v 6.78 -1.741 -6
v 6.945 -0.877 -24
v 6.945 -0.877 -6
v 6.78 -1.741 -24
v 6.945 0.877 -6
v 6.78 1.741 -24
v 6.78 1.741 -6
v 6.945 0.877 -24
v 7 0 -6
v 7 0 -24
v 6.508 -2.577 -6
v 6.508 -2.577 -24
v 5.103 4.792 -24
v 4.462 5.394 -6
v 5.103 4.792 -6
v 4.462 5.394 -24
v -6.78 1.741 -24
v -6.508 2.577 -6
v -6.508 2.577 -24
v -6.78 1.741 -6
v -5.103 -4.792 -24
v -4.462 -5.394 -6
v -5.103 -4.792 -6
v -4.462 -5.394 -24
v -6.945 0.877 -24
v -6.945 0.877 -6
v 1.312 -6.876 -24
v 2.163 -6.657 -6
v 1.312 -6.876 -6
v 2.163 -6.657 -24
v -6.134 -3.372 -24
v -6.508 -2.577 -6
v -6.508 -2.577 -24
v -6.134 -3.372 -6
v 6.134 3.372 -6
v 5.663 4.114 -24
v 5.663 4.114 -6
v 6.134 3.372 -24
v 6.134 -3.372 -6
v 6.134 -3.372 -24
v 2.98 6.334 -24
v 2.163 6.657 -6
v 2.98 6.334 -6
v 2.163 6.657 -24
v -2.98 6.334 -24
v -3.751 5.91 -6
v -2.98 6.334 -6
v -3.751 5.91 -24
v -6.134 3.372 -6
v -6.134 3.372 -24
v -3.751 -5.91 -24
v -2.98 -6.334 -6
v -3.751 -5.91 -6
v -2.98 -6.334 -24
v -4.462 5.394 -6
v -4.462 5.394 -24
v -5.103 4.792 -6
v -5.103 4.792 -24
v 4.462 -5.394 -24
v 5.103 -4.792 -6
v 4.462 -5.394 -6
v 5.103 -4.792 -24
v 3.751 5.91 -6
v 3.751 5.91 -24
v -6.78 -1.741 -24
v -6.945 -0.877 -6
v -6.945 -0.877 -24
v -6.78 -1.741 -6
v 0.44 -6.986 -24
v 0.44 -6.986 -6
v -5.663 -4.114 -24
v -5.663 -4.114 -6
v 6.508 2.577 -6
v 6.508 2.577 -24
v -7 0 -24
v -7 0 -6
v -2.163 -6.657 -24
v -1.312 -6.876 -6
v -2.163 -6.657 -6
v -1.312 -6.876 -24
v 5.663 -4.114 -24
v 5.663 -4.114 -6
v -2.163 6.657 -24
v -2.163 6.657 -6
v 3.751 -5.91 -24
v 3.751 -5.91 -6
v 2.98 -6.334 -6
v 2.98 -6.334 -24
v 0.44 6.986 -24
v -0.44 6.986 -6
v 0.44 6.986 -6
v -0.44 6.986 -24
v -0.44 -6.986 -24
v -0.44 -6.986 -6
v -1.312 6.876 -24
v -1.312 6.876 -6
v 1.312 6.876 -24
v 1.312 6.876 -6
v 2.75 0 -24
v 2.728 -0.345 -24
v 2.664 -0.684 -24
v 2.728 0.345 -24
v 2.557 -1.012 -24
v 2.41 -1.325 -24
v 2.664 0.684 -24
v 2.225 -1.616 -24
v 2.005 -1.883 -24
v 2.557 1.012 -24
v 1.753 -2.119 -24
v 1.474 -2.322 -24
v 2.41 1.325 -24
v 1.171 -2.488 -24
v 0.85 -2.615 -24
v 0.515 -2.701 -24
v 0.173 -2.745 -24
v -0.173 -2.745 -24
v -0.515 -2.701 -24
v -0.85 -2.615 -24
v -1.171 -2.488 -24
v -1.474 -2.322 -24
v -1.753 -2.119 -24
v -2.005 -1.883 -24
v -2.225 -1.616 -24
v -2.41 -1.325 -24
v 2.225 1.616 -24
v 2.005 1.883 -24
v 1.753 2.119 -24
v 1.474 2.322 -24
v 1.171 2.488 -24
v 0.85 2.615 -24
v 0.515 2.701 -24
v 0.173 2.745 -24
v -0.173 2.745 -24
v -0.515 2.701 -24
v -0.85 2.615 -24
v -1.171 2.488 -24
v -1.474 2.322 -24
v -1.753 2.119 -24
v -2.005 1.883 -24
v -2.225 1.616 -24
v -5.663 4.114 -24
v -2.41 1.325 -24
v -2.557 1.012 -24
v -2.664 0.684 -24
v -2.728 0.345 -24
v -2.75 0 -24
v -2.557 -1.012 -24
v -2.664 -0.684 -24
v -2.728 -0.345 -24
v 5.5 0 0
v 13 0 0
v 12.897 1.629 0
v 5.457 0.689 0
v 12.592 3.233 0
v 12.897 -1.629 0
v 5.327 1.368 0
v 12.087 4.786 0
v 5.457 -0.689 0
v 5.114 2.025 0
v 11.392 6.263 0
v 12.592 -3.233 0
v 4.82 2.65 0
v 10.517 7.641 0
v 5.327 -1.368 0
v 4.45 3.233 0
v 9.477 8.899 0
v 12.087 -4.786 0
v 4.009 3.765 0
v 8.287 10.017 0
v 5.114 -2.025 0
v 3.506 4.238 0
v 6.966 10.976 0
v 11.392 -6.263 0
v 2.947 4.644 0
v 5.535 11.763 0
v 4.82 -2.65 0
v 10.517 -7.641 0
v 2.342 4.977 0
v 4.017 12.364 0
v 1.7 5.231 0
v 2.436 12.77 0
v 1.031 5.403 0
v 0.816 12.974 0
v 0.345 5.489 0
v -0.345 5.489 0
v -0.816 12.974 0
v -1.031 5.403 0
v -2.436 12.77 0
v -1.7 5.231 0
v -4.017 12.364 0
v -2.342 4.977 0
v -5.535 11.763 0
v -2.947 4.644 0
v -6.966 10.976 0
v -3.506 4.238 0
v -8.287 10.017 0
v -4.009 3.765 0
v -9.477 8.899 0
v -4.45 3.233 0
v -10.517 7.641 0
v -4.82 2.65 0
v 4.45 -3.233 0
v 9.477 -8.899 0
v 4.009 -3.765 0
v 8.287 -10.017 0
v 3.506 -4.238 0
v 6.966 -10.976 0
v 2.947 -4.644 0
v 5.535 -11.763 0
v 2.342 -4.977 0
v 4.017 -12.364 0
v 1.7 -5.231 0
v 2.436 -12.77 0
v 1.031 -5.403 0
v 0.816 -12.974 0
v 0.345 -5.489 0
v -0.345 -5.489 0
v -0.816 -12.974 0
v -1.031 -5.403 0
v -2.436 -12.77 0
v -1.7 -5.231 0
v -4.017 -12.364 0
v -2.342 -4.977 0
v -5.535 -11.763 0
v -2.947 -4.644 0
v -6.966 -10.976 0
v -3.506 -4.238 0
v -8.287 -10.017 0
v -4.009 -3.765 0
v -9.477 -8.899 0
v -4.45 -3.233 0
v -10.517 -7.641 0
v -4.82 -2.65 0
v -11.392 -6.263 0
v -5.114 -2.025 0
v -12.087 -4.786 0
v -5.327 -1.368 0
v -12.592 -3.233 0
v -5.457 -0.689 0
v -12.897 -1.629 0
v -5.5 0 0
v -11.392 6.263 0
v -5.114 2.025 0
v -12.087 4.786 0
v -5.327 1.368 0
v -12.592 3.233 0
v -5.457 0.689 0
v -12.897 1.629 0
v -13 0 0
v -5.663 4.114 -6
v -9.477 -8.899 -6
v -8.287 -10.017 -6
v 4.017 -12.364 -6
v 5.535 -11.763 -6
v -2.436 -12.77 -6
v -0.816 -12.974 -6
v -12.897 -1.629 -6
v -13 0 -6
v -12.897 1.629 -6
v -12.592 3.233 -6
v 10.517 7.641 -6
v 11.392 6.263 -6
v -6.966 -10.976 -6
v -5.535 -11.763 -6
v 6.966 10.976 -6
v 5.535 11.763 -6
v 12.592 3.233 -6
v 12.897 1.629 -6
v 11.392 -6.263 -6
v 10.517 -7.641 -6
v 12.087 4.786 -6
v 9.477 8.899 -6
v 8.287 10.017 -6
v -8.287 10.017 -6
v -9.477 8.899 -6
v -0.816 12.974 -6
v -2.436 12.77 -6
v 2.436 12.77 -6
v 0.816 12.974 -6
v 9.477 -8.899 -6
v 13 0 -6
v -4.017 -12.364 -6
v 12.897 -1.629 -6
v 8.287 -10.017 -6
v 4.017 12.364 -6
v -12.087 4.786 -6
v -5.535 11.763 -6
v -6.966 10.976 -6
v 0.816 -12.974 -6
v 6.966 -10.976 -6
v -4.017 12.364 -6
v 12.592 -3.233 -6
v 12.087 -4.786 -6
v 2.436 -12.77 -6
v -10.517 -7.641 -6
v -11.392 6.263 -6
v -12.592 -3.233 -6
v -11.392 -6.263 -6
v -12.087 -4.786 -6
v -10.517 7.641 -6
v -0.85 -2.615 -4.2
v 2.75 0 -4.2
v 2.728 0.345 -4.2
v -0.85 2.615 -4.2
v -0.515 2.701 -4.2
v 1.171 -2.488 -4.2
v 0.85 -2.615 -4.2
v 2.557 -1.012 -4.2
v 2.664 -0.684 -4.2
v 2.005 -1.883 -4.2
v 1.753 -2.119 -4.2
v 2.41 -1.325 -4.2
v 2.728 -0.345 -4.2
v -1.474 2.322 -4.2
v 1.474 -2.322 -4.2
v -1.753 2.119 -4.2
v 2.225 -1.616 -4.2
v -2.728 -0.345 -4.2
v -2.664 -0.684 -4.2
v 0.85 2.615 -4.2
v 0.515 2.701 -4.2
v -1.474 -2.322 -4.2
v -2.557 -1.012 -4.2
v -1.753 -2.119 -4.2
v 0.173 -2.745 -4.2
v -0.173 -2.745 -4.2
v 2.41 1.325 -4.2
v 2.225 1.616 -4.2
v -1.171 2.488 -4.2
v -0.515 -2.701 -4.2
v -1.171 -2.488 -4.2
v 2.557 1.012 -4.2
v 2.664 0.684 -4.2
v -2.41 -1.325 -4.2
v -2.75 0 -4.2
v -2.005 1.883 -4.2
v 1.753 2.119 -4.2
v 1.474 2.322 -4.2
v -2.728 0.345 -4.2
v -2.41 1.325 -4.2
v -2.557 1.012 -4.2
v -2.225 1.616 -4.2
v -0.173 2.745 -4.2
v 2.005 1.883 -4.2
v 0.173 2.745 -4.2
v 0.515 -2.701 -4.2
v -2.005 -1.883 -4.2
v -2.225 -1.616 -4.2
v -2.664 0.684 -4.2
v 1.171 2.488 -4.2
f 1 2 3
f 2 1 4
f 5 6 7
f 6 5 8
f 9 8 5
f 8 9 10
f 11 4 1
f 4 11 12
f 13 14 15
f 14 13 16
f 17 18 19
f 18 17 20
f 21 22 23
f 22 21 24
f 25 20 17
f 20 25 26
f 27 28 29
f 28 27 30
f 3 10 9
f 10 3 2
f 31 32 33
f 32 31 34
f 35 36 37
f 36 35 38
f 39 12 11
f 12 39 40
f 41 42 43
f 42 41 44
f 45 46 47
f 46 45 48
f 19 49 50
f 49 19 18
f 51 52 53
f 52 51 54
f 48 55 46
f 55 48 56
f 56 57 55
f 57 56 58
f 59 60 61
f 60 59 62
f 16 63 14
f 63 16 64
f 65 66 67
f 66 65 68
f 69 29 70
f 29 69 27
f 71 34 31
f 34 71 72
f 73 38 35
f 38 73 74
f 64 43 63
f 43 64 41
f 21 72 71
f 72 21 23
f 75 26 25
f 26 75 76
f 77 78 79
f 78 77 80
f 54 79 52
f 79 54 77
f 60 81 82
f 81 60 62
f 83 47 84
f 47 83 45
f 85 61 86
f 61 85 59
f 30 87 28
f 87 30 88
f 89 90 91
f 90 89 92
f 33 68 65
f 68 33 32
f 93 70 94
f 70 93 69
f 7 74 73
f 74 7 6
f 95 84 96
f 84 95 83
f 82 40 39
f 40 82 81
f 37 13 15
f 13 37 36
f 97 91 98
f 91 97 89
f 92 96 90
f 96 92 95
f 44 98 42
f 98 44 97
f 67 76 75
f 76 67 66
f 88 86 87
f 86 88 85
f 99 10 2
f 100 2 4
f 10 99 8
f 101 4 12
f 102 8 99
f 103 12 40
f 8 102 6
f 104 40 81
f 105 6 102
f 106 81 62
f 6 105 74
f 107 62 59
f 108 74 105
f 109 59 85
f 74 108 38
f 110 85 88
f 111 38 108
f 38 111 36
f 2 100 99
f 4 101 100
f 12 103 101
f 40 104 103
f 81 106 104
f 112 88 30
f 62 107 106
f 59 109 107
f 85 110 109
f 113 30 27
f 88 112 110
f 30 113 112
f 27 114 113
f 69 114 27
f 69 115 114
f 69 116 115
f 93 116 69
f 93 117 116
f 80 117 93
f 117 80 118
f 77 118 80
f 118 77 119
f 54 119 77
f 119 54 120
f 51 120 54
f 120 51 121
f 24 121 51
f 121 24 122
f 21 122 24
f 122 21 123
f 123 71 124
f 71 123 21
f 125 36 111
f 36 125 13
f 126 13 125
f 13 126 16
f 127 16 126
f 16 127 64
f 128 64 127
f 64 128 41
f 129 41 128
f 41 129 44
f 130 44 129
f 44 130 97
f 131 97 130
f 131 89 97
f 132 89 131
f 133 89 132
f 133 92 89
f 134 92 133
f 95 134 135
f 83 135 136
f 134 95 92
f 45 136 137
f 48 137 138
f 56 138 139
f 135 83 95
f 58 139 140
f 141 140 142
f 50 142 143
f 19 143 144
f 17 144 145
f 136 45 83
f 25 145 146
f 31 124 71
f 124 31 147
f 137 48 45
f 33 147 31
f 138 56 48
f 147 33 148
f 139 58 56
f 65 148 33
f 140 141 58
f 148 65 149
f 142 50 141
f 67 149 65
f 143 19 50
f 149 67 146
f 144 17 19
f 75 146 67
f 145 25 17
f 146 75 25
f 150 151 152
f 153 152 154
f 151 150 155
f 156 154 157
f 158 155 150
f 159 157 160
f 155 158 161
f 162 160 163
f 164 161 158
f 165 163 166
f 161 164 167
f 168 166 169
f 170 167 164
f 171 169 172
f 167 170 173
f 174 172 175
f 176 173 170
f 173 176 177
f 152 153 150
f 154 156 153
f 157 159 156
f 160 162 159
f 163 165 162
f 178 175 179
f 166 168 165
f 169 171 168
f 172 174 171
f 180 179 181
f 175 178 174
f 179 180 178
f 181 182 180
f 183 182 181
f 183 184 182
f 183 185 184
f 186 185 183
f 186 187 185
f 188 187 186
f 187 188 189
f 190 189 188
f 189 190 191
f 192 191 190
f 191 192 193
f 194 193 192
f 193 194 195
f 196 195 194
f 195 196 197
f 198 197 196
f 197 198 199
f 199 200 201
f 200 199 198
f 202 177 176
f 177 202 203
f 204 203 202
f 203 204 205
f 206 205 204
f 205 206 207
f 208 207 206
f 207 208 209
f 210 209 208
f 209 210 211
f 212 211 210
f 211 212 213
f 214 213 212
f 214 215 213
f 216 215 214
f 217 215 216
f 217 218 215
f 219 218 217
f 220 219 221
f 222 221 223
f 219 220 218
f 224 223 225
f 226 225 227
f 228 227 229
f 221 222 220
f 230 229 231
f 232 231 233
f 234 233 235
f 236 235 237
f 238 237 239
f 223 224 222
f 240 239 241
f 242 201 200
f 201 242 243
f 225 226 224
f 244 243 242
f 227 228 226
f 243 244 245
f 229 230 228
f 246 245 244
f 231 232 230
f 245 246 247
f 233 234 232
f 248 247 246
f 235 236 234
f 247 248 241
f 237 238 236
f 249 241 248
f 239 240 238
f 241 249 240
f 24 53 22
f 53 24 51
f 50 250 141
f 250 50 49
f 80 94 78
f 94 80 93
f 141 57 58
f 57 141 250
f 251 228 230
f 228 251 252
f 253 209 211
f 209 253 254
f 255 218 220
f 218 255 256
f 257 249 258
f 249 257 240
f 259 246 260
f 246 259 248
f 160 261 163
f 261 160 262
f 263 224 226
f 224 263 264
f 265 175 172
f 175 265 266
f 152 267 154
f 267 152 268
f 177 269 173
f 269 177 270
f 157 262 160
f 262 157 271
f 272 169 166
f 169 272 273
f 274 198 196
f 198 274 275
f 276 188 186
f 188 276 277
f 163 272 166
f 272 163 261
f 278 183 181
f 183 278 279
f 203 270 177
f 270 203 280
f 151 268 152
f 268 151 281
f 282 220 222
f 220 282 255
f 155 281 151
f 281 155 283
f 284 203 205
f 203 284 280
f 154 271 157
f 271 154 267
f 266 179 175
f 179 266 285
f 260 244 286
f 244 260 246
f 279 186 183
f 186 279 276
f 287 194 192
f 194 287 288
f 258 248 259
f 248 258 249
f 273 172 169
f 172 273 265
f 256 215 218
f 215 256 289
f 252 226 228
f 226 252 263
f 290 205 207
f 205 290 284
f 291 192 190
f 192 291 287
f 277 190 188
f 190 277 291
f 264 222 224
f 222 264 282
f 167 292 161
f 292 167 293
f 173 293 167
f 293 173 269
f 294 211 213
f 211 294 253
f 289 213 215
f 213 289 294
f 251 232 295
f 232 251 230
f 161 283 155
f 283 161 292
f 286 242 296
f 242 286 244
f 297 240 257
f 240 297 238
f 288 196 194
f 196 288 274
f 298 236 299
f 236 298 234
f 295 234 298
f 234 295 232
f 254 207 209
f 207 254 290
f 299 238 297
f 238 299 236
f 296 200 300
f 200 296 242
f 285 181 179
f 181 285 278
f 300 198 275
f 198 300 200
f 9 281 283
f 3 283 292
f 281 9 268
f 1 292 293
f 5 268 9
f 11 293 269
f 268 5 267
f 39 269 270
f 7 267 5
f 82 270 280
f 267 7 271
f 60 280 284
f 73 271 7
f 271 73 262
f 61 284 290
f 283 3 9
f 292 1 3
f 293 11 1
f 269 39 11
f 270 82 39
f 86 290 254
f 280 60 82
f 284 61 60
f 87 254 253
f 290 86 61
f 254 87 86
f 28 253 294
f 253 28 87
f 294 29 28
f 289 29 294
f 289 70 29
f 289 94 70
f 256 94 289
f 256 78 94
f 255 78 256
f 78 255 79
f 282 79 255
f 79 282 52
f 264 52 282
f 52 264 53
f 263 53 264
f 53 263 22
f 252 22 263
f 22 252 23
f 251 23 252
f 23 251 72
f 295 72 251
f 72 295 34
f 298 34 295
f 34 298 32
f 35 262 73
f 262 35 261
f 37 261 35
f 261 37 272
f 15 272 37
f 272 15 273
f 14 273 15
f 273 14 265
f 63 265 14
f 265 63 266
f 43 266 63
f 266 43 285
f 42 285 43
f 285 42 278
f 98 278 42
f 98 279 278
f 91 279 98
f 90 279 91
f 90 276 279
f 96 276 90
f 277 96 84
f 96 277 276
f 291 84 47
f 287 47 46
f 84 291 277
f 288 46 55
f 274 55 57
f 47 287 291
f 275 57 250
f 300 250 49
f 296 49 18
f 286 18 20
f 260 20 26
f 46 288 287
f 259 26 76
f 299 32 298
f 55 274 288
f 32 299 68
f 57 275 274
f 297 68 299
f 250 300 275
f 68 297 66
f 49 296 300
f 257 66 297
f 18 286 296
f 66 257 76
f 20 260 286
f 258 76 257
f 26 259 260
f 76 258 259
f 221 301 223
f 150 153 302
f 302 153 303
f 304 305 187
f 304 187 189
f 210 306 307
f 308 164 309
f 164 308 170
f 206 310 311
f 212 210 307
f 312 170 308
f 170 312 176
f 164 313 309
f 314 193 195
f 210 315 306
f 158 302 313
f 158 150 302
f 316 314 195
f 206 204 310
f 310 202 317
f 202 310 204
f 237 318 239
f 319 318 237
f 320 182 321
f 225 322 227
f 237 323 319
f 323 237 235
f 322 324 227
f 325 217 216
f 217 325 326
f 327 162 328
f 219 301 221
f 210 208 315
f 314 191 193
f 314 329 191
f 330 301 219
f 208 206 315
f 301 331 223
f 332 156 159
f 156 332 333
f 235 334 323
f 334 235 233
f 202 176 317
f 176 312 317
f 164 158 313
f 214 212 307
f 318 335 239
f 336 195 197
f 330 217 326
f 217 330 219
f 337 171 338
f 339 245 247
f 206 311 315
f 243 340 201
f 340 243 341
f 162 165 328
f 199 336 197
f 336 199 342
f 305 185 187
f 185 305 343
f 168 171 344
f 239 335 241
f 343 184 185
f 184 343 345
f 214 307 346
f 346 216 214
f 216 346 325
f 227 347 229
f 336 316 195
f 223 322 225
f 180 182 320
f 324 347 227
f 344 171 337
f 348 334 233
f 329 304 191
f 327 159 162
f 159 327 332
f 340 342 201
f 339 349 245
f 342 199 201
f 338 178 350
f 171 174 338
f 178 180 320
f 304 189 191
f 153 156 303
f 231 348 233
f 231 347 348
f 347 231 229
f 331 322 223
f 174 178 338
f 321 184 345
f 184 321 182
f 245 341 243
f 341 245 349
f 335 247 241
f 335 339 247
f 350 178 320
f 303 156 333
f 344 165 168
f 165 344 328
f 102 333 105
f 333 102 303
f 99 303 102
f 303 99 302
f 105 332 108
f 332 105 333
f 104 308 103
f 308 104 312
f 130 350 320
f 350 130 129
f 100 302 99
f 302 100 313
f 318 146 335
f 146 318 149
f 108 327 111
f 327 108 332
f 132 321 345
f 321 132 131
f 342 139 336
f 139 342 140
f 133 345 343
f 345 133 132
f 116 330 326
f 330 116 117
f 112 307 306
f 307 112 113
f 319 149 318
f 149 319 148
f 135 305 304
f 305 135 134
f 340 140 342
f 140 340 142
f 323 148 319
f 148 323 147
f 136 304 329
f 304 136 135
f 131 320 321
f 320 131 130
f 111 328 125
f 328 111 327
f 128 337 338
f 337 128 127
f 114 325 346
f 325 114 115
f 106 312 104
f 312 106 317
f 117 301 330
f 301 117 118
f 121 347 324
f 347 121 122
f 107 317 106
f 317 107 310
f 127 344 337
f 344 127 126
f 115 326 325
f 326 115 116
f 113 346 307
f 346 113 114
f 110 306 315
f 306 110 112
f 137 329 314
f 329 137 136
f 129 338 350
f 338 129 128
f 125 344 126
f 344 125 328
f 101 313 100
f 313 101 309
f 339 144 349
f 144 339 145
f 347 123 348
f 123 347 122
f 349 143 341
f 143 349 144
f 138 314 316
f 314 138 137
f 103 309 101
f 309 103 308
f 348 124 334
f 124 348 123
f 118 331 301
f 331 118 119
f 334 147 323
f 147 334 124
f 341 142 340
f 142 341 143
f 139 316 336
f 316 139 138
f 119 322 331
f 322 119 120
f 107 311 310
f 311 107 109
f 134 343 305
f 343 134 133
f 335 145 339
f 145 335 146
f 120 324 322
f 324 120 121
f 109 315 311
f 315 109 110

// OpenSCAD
$fn = 50;


difference() {
	union() {
		translate(v = [0, 0, -24.0000000000]) {
			cylinder(h = 24, r = 7.0000000000);
		}
		translate(v = [0, 0, -6.0000000000]) {
			cylinder(h = 6, r = 13.0000000000);
		}
	}
	union() {
		translate(v = [0, 0, 0]) {
			rotate(a = [0, 0, 0]) {
				difference() {
					union() {
						#translate(v = [0, 0, -24.0000000000]) {
							cylinder(h = 24, r = 2.2500000000);
						}
						#translate(v = [0, 0, -4.2000000000]) {
							cylinder(h = 4.2000000000, r = 7.0000000000, r1 = 2.7500000000, r2 = 5.5000000000);
						}
						#translate(v = [0, 0, -24.0000000000]) {
							cylinder(h = 24, r = 2.7500000000);
						}
						#translate(v = [0, 0, -24.0000000000]) {
							cylinder(h = 24, r = 2.2500000000);
						}
					}
					union();
				}
			}
		}
	}
}
